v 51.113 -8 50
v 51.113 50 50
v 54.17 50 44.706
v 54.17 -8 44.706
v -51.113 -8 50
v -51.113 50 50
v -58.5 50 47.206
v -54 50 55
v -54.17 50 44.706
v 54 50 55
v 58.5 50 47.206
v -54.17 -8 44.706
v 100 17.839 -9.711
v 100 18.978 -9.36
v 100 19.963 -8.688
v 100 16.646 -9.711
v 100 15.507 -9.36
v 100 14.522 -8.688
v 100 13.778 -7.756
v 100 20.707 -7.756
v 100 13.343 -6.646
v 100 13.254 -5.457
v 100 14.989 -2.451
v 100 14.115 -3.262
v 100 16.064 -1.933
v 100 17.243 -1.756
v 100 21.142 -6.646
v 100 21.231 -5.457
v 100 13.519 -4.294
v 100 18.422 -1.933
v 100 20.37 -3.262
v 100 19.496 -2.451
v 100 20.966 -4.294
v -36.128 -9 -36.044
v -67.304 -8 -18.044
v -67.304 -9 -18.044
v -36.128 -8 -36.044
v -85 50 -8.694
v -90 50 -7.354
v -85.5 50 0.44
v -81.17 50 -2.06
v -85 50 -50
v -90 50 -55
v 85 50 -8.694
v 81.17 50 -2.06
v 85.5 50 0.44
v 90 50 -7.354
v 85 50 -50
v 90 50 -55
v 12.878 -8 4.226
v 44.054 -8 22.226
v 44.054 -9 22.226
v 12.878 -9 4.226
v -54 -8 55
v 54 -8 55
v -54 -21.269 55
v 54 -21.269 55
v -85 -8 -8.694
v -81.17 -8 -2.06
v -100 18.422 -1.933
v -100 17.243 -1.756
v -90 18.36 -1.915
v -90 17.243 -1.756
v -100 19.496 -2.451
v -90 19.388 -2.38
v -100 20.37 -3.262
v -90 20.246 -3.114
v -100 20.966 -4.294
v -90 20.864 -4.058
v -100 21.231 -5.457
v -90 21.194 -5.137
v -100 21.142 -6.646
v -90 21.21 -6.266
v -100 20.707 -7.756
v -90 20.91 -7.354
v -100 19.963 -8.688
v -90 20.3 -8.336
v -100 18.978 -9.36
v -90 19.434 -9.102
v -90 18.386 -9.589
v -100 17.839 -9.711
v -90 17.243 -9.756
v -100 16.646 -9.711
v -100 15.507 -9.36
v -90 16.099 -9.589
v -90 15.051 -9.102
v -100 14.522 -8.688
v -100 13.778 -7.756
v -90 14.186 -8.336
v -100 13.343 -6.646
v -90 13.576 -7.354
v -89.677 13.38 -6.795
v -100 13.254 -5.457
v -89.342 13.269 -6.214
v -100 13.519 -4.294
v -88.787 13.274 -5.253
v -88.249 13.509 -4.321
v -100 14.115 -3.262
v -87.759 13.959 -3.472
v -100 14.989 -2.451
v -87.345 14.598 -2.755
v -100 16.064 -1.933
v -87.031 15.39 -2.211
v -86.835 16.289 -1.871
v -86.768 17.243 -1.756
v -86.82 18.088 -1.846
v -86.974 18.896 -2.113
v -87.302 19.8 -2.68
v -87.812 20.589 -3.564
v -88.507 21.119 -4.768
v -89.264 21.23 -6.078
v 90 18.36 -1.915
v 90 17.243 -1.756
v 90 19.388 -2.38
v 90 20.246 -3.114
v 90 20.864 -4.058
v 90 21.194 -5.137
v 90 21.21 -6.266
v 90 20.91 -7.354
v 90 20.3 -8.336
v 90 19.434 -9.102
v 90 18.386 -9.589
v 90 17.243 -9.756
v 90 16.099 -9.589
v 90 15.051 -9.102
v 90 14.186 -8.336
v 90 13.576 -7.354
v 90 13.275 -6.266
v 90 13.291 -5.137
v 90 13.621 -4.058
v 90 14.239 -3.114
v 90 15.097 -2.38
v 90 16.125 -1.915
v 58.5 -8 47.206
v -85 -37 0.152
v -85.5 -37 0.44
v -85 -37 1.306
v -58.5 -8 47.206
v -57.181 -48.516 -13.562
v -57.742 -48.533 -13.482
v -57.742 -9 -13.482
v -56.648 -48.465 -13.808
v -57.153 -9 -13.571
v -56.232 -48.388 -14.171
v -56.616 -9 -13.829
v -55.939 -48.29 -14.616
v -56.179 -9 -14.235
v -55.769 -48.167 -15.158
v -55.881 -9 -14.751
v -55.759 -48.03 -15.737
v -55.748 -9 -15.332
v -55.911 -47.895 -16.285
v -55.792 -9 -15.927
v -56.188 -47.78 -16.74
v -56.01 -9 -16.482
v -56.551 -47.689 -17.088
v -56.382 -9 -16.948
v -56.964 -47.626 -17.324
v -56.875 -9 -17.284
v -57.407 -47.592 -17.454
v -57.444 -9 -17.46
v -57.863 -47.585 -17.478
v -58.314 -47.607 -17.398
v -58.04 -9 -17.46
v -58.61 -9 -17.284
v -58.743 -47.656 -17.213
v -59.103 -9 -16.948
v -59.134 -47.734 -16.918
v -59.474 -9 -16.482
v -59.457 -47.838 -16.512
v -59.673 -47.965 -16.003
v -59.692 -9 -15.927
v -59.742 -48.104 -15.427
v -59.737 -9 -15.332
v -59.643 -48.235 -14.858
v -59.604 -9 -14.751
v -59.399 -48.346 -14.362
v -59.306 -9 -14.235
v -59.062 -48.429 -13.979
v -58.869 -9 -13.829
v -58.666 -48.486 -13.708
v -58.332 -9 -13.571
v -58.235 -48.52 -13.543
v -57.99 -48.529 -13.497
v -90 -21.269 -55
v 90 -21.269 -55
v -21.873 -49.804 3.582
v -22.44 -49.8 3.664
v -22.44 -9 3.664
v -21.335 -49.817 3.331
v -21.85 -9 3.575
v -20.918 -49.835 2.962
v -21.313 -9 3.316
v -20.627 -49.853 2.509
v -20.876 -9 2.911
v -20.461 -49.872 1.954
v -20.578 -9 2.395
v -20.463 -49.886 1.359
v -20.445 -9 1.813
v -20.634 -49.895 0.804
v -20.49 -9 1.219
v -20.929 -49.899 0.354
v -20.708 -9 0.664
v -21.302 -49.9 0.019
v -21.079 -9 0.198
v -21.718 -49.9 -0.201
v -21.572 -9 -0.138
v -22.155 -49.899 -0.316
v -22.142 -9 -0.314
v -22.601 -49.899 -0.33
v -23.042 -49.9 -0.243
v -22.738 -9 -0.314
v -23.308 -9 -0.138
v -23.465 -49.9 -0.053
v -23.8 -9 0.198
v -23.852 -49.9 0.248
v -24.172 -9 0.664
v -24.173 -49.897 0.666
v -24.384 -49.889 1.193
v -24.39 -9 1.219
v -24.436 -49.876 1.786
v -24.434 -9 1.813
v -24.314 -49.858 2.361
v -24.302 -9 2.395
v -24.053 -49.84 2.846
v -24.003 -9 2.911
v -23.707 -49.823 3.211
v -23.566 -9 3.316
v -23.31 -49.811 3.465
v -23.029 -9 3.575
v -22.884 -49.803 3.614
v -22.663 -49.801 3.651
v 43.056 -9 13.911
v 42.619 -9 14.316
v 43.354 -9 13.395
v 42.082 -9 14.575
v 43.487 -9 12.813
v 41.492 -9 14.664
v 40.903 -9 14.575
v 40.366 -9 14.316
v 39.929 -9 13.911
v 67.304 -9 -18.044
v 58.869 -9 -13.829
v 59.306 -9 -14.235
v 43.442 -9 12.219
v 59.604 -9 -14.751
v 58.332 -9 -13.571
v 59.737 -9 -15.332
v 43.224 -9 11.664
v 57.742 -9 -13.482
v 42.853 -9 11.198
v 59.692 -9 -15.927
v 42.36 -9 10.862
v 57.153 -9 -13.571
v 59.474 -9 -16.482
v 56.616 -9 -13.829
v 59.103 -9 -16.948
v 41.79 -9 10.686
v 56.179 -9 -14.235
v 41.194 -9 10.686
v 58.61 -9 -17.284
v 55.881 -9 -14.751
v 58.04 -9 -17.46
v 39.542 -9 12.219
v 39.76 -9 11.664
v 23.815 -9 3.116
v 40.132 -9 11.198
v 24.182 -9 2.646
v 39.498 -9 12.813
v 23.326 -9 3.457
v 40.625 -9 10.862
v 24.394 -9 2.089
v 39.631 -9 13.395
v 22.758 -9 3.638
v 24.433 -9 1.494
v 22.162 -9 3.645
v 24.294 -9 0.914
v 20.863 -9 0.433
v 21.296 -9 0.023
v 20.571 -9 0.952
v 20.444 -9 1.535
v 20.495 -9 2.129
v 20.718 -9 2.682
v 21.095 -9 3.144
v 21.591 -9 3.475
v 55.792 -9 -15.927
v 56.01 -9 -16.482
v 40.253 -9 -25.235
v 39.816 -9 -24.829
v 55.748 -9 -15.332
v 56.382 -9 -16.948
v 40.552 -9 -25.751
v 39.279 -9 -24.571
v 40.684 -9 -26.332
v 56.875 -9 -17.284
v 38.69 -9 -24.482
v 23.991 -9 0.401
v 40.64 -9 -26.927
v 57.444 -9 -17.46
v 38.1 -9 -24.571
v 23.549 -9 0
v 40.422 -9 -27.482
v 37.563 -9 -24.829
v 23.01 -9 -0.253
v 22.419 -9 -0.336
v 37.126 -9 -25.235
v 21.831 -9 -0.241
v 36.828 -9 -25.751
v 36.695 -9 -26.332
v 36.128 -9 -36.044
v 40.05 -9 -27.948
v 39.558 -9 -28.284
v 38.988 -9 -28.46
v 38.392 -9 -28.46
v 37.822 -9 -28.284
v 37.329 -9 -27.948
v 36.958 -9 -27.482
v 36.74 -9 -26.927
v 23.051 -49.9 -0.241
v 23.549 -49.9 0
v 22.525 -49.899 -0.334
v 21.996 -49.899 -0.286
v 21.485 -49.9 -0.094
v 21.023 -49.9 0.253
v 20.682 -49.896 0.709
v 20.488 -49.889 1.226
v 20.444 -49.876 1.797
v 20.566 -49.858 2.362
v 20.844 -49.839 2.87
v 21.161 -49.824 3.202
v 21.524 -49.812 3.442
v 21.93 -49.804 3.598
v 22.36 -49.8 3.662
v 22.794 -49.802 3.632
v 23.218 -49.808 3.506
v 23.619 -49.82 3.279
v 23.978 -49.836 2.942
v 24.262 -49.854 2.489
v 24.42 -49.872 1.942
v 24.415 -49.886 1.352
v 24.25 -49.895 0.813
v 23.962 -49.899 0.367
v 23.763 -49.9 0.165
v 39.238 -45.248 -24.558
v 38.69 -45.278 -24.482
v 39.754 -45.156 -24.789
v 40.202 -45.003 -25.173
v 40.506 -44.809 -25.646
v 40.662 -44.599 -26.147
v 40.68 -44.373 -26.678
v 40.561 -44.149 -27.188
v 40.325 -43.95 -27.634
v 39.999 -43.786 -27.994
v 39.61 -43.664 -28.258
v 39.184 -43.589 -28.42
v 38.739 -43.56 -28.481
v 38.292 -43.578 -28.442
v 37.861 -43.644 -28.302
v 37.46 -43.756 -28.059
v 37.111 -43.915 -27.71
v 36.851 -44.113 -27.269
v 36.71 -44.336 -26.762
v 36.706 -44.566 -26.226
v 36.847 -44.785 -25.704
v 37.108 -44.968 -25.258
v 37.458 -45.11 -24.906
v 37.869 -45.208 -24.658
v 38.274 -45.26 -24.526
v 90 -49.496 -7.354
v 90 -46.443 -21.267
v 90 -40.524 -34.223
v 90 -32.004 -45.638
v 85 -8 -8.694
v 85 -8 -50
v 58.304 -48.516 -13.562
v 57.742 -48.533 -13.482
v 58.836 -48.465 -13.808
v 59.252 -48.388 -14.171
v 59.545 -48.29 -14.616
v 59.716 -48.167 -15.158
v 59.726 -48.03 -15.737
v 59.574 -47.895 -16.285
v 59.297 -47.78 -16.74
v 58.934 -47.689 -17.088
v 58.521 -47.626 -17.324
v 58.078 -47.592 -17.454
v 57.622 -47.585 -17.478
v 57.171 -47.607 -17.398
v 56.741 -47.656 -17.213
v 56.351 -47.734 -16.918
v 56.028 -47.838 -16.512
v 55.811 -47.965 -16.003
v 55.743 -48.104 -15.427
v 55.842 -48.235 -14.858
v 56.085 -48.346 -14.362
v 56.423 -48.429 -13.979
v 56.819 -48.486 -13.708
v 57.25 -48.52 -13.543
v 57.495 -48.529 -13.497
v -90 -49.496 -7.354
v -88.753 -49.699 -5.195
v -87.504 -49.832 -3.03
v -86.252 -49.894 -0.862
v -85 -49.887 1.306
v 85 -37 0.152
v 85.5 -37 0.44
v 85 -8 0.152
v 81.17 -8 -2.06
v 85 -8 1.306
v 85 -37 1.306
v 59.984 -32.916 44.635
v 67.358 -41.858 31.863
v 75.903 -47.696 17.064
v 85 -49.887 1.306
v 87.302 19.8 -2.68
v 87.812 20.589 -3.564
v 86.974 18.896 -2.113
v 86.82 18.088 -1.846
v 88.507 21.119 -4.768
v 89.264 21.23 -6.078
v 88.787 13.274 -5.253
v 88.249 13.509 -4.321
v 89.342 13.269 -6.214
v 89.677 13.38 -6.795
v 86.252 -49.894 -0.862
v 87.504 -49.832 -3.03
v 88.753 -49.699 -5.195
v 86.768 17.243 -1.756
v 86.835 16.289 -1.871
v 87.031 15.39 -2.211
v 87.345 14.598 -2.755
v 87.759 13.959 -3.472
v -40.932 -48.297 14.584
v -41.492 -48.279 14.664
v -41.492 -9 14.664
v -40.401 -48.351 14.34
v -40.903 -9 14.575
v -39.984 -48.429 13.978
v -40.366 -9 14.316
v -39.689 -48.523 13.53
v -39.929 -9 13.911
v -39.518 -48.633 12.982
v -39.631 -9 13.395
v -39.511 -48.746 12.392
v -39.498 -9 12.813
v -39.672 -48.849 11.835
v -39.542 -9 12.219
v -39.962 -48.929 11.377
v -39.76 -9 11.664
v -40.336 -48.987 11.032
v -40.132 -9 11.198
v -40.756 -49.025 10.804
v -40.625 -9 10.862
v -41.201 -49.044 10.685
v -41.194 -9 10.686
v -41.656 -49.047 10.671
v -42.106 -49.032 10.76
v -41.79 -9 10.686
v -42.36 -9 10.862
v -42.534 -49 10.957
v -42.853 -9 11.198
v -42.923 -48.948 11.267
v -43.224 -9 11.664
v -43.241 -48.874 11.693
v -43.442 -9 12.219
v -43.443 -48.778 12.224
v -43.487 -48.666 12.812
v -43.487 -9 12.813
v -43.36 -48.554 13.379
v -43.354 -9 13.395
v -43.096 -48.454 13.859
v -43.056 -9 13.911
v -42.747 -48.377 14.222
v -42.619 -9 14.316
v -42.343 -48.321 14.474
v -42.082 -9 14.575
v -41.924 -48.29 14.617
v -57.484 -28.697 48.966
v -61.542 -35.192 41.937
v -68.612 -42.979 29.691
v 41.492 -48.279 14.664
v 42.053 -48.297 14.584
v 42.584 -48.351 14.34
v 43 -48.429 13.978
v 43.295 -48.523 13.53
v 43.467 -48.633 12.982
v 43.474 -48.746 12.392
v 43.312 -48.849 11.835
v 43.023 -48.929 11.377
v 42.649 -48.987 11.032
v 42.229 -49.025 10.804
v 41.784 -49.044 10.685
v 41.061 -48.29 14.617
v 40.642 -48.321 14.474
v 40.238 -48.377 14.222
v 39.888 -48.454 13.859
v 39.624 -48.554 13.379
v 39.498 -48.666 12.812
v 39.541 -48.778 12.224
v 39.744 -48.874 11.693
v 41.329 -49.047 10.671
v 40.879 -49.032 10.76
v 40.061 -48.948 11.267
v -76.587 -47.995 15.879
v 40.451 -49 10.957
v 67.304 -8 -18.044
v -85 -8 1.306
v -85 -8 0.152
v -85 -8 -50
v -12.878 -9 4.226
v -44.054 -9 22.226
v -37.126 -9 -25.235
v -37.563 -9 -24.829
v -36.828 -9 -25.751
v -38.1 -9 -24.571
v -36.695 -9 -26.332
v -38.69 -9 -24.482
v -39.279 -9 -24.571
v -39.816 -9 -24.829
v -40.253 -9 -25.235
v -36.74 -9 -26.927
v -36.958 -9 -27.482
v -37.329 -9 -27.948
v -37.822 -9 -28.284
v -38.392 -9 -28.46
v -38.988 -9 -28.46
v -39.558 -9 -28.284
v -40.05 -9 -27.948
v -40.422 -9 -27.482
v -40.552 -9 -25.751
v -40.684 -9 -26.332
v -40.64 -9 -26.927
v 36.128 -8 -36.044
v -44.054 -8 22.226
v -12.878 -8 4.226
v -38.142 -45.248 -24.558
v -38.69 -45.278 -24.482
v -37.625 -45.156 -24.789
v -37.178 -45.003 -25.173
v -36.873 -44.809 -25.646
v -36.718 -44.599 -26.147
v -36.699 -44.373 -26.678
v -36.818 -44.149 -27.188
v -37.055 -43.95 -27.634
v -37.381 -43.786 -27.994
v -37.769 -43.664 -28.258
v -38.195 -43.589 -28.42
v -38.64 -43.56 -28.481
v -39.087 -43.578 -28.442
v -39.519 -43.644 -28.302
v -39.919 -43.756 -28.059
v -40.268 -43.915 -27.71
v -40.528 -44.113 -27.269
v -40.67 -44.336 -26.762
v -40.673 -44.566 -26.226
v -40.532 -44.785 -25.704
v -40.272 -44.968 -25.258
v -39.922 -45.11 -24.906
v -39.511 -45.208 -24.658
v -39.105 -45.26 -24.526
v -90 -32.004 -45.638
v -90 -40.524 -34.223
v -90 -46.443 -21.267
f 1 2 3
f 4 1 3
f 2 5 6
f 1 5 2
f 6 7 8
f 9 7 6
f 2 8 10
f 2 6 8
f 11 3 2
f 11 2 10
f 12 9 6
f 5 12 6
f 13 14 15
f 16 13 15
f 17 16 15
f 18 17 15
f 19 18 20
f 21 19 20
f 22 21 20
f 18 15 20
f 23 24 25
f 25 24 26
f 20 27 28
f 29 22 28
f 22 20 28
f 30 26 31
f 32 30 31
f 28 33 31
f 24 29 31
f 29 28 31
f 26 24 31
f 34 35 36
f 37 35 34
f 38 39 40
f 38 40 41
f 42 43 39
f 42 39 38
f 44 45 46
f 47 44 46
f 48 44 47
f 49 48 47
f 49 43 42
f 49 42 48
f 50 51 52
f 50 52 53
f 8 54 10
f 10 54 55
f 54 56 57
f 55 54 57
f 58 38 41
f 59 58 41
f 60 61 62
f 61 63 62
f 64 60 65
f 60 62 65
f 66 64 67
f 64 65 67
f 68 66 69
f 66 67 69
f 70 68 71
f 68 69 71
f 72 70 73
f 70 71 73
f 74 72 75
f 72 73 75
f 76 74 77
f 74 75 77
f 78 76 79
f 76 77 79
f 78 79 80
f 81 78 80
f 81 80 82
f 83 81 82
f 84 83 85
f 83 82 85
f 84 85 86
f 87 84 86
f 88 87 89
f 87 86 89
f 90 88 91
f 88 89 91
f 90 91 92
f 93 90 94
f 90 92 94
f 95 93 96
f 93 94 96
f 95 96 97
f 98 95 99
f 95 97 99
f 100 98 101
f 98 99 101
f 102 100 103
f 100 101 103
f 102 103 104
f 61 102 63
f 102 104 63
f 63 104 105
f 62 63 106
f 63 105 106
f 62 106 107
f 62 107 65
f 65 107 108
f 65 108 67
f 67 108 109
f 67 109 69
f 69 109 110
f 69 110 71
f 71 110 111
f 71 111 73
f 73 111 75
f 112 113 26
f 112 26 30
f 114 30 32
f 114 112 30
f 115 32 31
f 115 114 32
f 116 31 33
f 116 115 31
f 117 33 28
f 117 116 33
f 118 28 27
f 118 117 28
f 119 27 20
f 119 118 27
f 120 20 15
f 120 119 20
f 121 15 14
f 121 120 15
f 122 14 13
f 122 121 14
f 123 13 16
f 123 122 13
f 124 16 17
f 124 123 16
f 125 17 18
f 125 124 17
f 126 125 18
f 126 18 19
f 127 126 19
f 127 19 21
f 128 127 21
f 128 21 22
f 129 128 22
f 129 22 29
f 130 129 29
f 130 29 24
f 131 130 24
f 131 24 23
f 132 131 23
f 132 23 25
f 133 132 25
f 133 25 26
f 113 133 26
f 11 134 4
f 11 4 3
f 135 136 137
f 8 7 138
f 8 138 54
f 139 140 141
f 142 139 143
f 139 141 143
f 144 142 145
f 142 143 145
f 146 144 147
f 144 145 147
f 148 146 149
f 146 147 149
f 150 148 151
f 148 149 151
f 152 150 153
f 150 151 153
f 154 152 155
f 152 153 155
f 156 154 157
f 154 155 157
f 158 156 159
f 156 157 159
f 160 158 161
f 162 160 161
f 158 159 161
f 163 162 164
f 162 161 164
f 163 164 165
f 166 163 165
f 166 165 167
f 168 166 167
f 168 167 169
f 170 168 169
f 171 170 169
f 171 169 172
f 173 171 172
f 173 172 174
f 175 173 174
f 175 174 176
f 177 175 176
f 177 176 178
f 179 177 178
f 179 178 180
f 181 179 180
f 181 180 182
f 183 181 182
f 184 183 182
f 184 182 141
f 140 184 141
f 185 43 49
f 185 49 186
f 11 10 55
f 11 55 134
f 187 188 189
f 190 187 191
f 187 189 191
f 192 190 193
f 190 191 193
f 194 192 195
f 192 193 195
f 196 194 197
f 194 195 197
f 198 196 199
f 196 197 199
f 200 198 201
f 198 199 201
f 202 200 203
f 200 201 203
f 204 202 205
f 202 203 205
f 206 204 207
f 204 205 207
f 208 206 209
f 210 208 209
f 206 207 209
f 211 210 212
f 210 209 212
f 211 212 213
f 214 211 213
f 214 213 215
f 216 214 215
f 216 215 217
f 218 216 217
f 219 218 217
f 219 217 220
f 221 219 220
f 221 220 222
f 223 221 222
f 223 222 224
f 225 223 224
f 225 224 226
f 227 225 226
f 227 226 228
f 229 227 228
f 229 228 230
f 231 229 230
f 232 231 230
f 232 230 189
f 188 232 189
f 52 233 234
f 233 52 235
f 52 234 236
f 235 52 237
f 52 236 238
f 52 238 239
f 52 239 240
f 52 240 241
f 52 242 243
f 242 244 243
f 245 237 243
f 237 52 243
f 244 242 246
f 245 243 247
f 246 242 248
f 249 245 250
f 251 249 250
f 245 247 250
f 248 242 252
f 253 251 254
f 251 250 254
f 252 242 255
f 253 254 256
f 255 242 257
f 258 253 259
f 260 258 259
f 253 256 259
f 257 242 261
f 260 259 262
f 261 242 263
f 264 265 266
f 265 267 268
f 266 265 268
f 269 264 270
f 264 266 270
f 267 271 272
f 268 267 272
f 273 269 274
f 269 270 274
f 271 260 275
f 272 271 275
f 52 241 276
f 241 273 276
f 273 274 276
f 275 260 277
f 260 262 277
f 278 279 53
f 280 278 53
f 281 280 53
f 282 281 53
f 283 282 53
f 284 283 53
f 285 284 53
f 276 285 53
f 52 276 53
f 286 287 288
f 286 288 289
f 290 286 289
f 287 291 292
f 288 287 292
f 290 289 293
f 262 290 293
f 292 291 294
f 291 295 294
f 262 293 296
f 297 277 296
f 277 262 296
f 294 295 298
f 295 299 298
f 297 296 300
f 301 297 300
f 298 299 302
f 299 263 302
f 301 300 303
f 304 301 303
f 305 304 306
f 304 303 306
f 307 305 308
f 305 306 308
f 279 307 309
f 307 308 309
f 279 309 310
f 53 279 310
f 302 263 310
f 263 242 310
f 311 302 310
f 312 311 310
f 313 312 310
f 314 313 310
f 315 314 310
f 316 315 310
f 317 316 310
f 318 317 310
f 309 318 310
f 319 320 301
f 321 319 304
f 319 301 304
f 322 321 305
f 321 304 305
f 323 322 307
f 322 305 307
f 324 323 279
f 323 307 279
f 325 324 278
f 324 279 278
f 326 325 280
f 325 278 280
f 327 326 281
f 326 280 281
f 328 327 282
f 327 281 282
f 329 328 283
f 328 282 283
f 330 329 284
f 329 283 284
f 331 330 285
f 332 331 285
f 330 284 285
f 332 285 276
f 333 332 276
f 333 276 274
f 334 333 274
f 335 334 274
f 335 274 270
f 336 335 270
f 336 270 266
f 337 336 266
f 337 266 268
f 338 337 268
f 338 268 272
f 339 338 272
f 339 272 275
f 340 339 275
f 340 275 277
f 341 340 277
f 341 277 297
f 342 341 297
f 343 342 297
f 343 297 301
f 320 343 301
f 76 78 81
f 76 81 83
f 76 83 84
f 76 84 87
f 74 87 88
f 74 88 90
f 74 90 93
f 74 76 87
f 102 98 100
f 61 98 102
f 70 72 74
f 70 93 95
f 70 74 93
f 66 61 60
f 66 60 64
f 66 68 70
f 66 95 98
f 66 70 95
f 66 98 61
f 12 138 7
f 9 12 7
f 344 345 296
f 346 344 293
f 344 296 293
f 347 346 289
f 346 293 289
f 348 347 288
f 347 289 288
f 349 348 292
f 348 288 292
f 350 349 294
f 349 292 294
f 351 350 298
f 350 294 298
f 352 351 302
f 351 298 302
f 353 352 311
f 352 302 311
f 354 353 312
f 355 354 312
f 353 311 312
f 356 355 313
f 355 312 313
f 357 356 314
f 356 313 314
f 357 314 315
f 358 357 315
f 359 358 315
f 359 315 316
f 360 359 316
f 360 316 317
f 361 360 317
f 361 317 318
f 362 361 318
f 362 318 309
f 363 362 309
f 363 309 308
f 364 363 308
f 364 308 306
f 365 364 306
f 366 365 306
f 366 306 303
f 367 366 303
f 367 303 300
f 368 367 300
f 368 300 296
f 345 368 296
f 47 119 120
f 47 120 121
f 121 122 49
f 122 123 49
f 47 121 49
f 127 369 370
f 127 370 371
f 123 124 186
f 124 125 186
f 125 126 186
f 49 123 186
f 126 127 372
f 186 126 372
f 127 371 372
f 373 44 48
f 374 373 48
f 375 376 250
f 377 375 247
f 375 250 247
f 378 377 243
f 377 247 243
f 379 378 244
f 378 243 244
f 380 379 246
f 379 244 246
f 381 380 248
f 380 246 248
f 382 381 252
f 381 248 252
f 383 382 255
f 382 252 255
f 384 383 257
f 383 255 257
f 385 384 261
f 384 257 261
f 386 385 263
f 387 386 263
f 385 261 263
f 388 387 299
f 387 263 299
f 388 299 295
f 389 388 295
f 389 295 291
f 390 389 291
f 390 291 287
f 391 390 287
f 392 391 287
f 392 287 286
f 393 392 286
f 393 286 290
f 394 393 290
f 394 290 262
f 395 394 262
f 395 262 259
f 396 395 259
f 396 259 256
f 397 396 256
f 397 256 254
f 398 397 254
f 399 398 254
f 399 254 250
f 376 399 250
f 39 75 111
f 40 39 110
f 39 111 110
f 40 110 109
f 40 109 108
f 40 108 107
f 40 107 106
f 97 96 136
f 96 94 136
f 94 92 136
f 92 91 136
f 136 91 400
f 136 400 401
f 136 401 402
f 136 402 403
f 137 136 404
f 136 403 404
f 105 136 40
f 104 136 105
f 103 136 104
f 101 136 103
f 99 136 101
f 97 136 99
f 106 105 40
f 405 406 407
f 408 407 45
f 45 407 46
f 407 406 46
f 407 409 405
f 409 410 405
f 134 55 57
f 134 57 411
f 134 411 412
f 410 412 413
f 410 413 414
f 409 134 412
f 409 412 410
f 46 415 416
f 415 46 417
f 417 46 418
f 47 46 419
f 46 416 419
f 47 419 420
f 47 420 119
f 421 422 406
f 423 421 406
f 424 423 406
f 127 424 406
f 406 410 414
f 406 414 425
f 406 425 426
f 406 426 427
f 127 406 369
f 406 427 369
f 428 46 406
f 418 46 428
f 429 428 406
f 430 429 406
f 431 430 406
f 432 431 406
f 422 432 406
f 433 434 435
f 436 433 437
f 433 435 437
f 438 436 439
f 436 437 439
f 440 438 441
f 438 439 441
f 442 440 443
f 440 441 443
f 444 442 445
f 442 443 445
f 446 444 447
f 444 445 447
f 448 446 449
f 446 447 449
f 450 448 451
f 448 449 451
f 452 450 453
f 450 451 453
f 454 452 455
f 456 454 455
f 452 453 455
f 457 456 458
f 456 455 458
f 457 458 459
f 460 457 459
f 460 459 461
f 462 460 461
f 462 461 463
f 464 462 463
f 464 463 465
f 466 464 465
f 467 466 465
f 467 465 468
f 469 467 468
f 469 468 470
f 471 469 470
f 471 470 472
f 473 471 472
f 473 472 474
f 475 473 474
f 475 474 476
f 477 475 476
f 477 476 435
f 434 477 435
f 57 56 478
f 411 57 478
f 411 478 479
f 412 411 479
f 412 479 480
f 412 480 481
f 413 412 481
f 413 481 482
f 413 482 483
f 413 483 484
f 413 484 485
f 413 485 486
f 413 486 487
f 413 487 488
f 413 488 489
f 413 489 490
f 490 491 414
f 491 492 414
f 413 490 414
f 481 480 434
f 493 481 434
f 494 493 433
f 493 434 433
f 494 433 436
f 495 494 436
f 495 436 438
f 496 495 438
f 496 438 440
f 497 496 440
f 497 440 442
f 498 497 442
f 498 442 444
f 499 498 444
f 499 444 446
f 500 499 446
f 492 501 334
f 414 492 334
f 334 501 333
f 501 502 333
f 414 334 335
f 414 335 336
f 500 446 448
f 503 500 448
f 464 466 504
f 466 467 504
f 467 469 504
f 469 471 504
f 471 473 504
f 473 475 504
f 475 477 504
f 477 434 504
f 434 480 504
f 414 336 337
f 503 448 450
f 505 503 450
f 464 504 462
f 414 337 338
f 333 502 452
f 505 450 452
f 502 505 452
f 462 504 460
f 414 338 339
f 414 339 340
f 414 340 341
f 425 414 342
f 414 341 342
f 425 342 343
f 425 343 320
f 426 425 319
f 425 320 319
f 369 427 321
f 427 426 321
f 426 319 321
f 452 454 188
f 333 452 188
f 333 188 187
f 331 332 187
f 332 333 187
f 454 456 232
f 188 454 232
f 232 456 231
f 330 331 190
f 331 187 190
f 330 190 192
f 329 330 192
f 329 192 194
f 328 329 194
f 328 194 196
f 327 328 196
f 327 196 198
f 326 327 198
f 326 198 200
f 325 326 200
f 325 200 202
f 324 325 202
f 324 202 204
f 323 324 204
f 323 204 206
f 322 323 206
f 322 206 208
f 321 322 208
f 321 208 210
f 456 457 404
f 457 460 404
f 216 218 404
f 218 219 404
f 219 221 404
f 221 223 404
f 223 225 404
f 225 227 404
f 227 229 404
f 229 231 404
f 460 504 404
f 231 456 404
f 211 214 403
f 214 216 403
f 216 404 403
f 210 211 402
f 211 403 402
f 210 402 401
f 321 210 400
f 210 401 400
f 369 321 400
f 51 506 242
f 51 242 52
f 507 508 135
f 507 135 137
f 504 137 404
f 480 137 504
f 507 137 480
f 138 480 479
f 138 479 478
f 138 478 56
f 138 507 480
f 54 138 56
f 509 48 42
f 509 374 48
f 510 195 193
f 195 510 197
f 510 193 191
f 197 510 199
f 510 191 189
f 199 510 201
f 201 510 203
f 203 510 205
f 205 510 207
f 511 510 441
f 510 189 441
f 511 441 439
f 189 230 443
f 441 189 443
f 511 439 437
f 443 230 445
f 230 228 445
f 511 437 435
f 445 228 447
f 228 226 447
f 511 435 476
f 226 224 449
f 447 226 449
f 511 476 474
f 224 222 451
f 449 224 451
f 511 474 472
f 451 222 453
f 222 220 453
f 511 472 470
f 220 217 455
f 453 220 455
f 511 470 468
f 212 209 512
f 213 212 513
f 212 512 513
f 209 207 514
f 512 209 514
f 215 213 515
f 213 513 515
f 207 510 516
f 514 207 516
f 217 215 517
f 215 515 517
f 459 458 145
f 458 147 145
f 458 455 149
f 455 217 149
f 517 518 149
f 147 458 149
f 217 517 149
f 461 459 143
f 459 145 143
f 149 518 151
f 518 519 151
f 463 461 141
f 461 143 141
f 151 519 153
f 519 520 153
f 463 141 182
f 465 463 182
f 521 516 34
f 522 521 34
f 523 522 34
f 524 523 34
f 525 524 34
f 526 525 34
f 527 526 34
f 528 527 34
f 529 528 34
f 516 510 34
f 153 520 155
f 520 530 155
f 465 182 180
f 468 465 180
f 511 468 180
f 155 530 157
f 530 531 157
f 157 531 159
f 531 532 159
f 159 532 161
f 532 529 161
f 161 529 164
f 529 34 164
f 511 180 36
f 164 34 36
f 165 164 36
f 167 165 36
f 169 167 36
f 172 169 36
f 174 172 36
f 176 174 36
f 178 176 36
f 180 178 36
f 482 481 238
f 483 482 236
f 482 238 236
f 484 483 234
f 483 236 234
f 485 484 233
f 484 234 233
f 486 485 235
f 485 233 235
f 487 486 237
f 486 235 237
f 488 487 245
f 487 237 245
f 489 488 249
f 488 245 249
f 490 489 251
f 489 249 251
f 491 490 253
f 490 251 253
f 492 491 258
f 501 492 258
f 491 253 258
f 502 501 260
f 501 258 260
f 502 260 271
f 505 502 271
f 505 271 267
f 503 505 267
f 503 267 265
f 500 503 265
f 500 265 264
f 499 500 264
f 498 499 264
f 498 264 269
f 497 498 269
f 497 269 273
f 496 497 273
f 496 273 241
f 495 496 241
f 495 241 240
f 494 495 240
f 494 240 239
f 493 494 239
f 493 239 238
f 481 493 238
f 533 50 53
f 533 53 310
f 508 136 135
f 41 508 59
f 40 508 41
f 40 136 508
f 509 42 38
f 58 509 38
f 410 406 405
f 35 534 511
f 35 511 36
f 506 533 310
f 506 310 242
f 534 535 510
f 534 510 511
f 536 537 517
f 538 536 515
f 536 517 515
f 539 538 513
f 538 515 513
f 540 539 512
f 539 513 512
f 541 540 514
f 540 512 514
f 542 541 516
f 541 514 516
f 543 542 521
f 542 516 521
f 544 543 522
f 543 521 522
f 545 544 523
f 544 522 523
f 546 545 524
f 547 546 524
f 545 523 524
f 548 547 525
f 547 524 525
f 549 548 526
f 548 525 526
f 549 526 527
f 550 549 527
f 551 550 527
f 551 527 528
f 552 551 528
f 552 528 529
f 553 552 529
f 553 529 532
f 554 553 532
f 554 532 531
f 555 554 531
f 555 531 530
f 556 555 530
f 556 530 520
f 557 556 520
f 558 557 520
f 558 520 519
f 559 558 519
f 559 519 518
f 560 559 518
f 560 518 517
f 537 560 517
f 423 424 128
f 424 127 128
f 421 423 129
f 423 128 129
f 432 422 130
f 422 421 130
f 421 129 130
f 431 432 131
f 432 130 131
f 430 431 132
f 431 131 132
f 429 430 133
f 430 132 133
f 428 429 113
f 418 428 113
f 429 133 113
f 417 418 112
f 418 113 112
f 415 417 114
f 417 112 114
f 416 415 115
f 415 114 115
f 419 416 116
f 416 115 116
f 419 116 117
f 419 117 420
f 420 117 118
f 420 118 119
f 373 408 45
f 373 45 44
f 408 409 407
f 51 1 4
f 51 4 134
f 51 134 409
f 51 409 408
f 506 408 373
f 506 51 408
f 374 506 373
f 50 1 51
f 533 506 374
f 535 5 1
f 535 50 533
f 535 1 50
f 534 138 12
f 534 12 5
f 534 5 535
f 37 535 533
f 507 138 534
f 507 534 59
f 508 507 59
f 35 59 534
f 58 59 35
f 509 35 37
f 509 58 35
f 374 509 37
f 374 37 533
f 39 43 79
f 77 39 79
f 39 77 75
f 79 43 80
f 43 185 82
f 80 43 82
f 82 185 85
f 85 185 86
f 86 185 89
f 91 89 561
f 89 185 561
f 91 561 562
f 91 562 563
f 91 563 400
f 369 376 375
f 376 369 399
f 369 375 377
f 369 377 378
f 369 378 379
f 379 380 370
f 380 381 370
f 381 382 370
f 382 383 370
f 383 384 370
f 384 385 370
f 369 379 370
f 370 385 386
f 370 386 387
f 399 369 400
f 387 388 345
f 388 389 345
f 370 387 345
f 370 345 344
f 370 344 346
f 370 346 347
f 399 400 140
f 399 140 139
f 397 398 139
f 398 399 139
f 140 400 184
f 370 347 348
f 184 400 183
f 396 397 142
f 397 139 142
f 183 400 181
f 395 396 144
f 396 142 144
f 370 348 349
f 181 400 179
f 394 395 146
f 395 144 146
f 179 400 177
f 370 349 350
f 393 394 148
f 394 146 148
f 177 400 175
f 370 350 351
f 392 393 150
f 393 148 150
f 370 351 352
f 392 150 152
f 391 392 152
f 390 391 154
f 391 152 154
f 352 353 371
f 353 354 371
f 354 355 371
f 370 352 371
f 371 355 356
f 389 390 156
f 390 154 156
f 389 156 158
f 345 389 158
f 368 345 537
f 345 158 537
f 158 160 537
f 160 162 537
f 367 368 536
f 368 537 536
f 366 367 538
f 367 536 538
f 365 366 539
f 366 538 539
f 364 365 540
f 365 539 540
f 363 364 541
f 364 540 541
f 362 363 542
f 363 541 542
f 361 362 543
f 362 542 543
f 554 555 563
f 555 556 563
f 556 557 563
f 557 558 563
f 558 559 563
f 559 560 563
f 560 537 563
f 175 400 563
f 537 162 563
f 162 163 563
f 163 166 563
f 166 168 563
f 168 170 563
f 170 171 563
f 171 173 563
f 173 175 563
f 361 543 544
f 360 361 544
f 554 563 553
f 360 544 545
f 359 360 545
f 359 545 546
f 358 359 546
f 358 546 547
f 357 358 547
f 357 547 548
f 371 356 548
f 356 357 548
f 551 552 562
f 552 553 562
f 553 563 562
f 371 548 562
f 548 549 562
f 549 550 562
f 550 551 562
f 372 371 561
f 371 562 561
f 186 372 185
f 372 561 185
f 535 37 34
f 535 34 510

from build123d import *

# Parameters (mm, degrees)
BOSS_EXTRUDE1_DEPTH             = 50
BOSS_EXTRUDE1_DEPTH_BACK        = 50
CUT_EXTRUDE9_REACH              = 196.743
SHELL1_T                        = -5
SKETCH5_W                       = 54
SKETCH5_H                       = 87
CUT_EXTRUDE2_DEPTH              = 5
BOSS_EXTRUDE4_REACH             = 192.132
SKETCH6_R                       = 2
CUT_EXTRUDE4_DEPTH              = 121.370262108
SKETCH6_4_R                     = 2
CUT_EXTRUDE5_DEPTH              = 1
CUT_EXTRUDE10_REACH             = 122.37
SKETCH18_R                      = 4
BOSS_EXTRUDE5_DEPTH             = 10
BOSS_EXTRUDE5_DIRECTION_2_REACH = 196.743


with BuildPart() as part:
    # Sketch2 → Boss-Extrude1 (new, two sides: drawn at the far end of the back side and taken through both)
    with BuildSketch(Plane(origin=(0, 0, 0), x_dir=(1, 0, 0), z_dir=(0, 1, 0)).offset(-BOSS_EXTRUDE1_DEPTH_BACK)):
        Polygon((-90, 7.353829072), (-54, -55), (54, -55), (90, 7.353829072), (90, 55), (-90, 55), align=None)
    extrude(amount=BOSS_EXTRUDE1_DEPTH + BOSS_EXTRUDE1_DEPTH_BACK)

    # Sketch13 → Cut-Extrude9 (cut, up to next)
    with BuildSketch(Plane.ZY.offset(90), mode=Mode.PRIVATE) as cut_extrude9_sk1:
        with BuildLine():
            Line((-55, -21.268810449), (-55, -50))
            Line((-55, -50), (-7.353829072, -50))
            Line((-7.353829072, -50), (-7.353829072, -49.496068946))
            ThreePointArc((-7.353829072, -49.496068946), (-34.222719509, -40.523602958), (-55, -21.268810449))
        make_face()
    cut_extrude9_tool1 = extrude(cut_extrude9_sk1.sketch, amount=-CUT_EXTRUDE9_REACH, mode=Mode.PRIVATE) & part.part
    # Sketch13 → Cut-Extrude9 (cut, up to next)
    with BuildSketch(Plane.ZY.offset(90), mode=Mode.PRIVATE) as cut_extrude9_sk2:
        with BuildLine():
            Line((-7.353829072, -49.496068946), (-7.353829072, -50))
            Line((-7.353829072, -50), (55, -50))
            Line((55, -50), (55, -21.268810449))
            ThreePointArc((55, -21.268810449), (27.689960845, -43.924342078), (-7.353829072, -49.496068946))
        make_face()
    cut_extrude9_tool2 = extrude(cut_extrude9_sk2.sketch, amount=-CUT_EXTRUDE9_REACH, mode=Mode.PRIVATE) & part.part
    add(cut_extrude9_tool1.solids().sort_by_distance((-90, -41.817219, -41.87257))[0], mode=Mode.SUBTRACT)
    add(cut_extrude9_tool2.solids().sort_by_distance((-90, -41.875278, 41.569998))[0], mode=Mode.SUBTRACT)

    # Shell1
    shell1_openings = [part.faces().sort_by_distance(p)[0] for p in [
        (0, 50, -4.375017638),
    ]]
    offset(amount=SHELL1_T, openings=shell1_openings, kind=Kind.INTERSECTION)

    # Sketch5 → Cut-Extrude2 (cut)
    with BuildSketch(Plane(origin=(-64.315698604, 0, 37.132685902), x_dir=(0.500000000000001, 0, 0.8660254037844382), z_dir=(-0.866025403784438, 0, 0.5000000000000009))):
        with Locations((-15.368602792, 6.5)):
            Rectangle(SKETCH5_W, SKETCH5_H)
    cut_extrude2 = extrude(amount=-CUT_EXTRUDE2_DEPTH, mode=Mode.SUBTRACT)

    # Mirror1: Cut-Extrude2 across plane
    add(cut_extrude2.mirror(Plane(origin=(0, 0, 0), x_dir=(0, 0, 1), z_dir=(1, 0, 0))), mode=Mode.SUBTRACT)

    # Boss-Extrude4: up to this face of the body (flat: up to its plane)
    boss_extrude4_end = Plane(part.part.faces().sort_by_distance((85, 6.834453574, -28.402154485))[0])
    # Sketch16 → Boss-Extrude4 (add, up to the picked face)
    with BuildSketch(Plane(origin=(-85, 0, 0), x_dir=(0, 0, -1), z_dir=(1, 0, 0)), mode=Mode.PRIVATE) as boss_extrude4_sk1:
        with BuildLine():
            Line((-55, -8), (55, -8))
            Line((55, -8), (55, -21.268810449))
            ThreePointArc((55, -21.268810449), (0, -49.9), (-55, -21.268810449))
            Line((-55, -21.268810449), (-55, -8))
        make_face()
    boss_extrude4_tool1 = split(extrude(boss_extrude4_sk1.sketch, amount=BOSS_EXTRUDE4_REACH, mode=Mode.PRIVATE), bisect_by=boss_extrude4_end, keep=Keep.BOTH, mode=Mode.PRIVATE)
    add(boss_extrude4_tool1.solids().sort_by(Axis((-85, -25.669954, 0), (1, 0, 0)))[0])

    # Sketch6 → Cut-Extrude4 (cut, through all)
    with BuildSketch(Plane(origin=(0, -8, 0), x_dir=(1, 0, 0), z_dir=(0, 1, 0))):
        with Locations(Location((-57.742314098, 15.481878155, 0), (0, 0, 270))):
            Circle(SKETCH6_R)
        with Locations(Location((-38.689755215, 26.481878155, 0), (0, 0, 270))):
            Circle(SKETCH6_R)
        with Locations(Location((-41.492314098, -12.663947468, 0), (0, 0, 270))):
            Circle(SKETCH6_R)
        with Locations(Location((-22.439755215, -1.663947468, 0), (0, 0, 270))):
            Circle(SKETCH6_R)
        with Locations(Location((22.439755215, -1.663947468, 0), (0, 0, 56.302025246))):
            Circle(SKETCH6_R)
        with Locations(Location((41.492314098, -12.663947468, 0), (0, 0, 270))):
            Circle(SKETCH6_R)
        with Locations(Location((38.689755215, 26.481878155, 0), (0, 0, 270))):
            Circle(SKETCH6_R)
        with Locations(Location((57.742314098, 15.481878155, 0), (0, 0, 270))):
            Circle(SKETCH6_R)
    extrude(amount=-CUT_EXTRUDE4_DEPTH, mode=Mode.SUBTRACT)

    # Sketch6<4> → Cut-Extrude5 (cut)
    # profile 1 of 2: a face of its own
    with BuildSketch(Plane(origin=(0, -8, 0), x_dir=(1, 0, 0), z_dir=(0, 1, 0))):
        Polygon((36.127577388, 36.044055982), (67.304491924, 18.044055982), (44.054491924, -22.226125294), (12.877577388, -4.226125294), align=None)
        with Locations(Location((38.689755215, 26.481878155, 0), (0, 0, 270))):
            Circle(SKETCH6_4_R, mode=Mode.SUBTRACT)
        with Locations(Location((22.439755215, -1.663947468, 0), (0, 0, 270))):
            Circle(SKETCH6_4_R, mode=Mode.SUBTRACT)
        with Locations(Location((41.492314098, -12.663947468, 0), (0, 0, 270))):
            Circle(SKETCH6_4_R, mode=Mode.SUBTRACT)
        with Locations(Location((57.742314098, 15.481878155, 0), (0, 0, 270))):
            Circle(SKETCH6_4_R, mode=Mode.SUBTRACT)
    # profile 2 of 2: a face of its own
    with BuildSketch(Plane(origin=(0, -8, 0), x_dir=(1, 0, 0), z_dir=(0, 1, 0))):
        Polygon((-36.127577388, 36.044055982), (-12.877577388, -4.226125294), (-44.054491924, -22.226125294), (-67.304491924, 18.044055982), align=None)
    extrude(amount=-CUT_EXTRUDE5_DEPTH, mode=Mode.SUBTRACT)

    # Sketch17 → Cut-Extrude10 (cut, up to next)
    with BuildSketch(Plane(origin=(0, -8, 0), x_dir=(1, 0, 0), z_dir=(0, 1, 0)), mode=Mode.PRIVATE) as cut_extrude10_sk1:
        Polygon((-54, -55), (-85, -55), (-85, -1.306424965), align=None)
    cut_extrude10_tool1 = extrude(cut_extrude10_sk1.sketch, amount=-CUT_EXTRUDE10_REACH, mode=Mode.PRIVATE) & part.part
    # Sketch17 → Cut-Extrude10 (cut, up to next)
    with BuildSketch(Plane(origin=(0, -8, 0), x_dir=(1, 0, 0), z_dir=(0, 1, 0)), mode=Mode.PRIVATE) as cut_extrude10_sk2:
        Polygon((85, -55), (54, -55), (85, -1.306424965), align=None)
    cut_extrude10_tool2 = extrude(cut_extrude10_sk2.sketch, amount=-CUT_EXTRUDE10_REACH, mode=Mode.PRIVATE) & part.part
    add(cut_extrude10_tool1.solids().sort_by_distance((-74.666667, -8, 37.102142))[0], mode=Mode.SUBTRACT)
    add(cut_extrude10_tool2.solids().sort_by_distance((74.666667, -8, 37.102142))[0], mode=Mode.SUBTRACT)

    # Sketch18 → Boss-Extrude5 (add)
    with BuildSketch(Plane.ZY.offset(90)):
        with Locations((-5.755783353, 17.2426)):
            Circle(SKETCH18_R)
    boss_extrude5 = extrude(amount=BOSS_EXTRUDE5_DEPTH)

    # Sketch18 → Boss-Extrude5 direction 2 (add, up to next)
    with BuildSketch(Plane.ZY.offset(90), mode=Mode.PRIVATE) as boss_extrude5_direction_2_sk1:
        with Locations((-5.755783353, 17.2426)):
            Circle(SKETCH18_R)
    boss_extrude5_direction_2_tool1 = extrude(boss_extrude5_direction_2_sk1.sketch, amount=-BOSS_EXTRUDE5_DIRECTION_2_REACH, mode=Mode.PRIVATE) - part.part
    boss_extrude5_direction_2 = boss_extrude5_direction_2_tool1.solids().sort_by_distance((-90, 17.2426, -5.755783))[0]
    add(boss_extrude5_direction_2)

    # Mirror2: Boss-Extrude5, Boss-Extrude5 direction 2 across plane
    add(boss_extrude5.mirror(Plane(origin=(0, 0, 0), x_dir=(0, 0, 1), z_dir=(1, 0, 0))))
    add(boss_extrude5_direction_2.mirror(Plane(origin=(0, 0, 0), x_dir=(0, 0, 1), z_dir=(1, 0, 0))))


solid = part.part
